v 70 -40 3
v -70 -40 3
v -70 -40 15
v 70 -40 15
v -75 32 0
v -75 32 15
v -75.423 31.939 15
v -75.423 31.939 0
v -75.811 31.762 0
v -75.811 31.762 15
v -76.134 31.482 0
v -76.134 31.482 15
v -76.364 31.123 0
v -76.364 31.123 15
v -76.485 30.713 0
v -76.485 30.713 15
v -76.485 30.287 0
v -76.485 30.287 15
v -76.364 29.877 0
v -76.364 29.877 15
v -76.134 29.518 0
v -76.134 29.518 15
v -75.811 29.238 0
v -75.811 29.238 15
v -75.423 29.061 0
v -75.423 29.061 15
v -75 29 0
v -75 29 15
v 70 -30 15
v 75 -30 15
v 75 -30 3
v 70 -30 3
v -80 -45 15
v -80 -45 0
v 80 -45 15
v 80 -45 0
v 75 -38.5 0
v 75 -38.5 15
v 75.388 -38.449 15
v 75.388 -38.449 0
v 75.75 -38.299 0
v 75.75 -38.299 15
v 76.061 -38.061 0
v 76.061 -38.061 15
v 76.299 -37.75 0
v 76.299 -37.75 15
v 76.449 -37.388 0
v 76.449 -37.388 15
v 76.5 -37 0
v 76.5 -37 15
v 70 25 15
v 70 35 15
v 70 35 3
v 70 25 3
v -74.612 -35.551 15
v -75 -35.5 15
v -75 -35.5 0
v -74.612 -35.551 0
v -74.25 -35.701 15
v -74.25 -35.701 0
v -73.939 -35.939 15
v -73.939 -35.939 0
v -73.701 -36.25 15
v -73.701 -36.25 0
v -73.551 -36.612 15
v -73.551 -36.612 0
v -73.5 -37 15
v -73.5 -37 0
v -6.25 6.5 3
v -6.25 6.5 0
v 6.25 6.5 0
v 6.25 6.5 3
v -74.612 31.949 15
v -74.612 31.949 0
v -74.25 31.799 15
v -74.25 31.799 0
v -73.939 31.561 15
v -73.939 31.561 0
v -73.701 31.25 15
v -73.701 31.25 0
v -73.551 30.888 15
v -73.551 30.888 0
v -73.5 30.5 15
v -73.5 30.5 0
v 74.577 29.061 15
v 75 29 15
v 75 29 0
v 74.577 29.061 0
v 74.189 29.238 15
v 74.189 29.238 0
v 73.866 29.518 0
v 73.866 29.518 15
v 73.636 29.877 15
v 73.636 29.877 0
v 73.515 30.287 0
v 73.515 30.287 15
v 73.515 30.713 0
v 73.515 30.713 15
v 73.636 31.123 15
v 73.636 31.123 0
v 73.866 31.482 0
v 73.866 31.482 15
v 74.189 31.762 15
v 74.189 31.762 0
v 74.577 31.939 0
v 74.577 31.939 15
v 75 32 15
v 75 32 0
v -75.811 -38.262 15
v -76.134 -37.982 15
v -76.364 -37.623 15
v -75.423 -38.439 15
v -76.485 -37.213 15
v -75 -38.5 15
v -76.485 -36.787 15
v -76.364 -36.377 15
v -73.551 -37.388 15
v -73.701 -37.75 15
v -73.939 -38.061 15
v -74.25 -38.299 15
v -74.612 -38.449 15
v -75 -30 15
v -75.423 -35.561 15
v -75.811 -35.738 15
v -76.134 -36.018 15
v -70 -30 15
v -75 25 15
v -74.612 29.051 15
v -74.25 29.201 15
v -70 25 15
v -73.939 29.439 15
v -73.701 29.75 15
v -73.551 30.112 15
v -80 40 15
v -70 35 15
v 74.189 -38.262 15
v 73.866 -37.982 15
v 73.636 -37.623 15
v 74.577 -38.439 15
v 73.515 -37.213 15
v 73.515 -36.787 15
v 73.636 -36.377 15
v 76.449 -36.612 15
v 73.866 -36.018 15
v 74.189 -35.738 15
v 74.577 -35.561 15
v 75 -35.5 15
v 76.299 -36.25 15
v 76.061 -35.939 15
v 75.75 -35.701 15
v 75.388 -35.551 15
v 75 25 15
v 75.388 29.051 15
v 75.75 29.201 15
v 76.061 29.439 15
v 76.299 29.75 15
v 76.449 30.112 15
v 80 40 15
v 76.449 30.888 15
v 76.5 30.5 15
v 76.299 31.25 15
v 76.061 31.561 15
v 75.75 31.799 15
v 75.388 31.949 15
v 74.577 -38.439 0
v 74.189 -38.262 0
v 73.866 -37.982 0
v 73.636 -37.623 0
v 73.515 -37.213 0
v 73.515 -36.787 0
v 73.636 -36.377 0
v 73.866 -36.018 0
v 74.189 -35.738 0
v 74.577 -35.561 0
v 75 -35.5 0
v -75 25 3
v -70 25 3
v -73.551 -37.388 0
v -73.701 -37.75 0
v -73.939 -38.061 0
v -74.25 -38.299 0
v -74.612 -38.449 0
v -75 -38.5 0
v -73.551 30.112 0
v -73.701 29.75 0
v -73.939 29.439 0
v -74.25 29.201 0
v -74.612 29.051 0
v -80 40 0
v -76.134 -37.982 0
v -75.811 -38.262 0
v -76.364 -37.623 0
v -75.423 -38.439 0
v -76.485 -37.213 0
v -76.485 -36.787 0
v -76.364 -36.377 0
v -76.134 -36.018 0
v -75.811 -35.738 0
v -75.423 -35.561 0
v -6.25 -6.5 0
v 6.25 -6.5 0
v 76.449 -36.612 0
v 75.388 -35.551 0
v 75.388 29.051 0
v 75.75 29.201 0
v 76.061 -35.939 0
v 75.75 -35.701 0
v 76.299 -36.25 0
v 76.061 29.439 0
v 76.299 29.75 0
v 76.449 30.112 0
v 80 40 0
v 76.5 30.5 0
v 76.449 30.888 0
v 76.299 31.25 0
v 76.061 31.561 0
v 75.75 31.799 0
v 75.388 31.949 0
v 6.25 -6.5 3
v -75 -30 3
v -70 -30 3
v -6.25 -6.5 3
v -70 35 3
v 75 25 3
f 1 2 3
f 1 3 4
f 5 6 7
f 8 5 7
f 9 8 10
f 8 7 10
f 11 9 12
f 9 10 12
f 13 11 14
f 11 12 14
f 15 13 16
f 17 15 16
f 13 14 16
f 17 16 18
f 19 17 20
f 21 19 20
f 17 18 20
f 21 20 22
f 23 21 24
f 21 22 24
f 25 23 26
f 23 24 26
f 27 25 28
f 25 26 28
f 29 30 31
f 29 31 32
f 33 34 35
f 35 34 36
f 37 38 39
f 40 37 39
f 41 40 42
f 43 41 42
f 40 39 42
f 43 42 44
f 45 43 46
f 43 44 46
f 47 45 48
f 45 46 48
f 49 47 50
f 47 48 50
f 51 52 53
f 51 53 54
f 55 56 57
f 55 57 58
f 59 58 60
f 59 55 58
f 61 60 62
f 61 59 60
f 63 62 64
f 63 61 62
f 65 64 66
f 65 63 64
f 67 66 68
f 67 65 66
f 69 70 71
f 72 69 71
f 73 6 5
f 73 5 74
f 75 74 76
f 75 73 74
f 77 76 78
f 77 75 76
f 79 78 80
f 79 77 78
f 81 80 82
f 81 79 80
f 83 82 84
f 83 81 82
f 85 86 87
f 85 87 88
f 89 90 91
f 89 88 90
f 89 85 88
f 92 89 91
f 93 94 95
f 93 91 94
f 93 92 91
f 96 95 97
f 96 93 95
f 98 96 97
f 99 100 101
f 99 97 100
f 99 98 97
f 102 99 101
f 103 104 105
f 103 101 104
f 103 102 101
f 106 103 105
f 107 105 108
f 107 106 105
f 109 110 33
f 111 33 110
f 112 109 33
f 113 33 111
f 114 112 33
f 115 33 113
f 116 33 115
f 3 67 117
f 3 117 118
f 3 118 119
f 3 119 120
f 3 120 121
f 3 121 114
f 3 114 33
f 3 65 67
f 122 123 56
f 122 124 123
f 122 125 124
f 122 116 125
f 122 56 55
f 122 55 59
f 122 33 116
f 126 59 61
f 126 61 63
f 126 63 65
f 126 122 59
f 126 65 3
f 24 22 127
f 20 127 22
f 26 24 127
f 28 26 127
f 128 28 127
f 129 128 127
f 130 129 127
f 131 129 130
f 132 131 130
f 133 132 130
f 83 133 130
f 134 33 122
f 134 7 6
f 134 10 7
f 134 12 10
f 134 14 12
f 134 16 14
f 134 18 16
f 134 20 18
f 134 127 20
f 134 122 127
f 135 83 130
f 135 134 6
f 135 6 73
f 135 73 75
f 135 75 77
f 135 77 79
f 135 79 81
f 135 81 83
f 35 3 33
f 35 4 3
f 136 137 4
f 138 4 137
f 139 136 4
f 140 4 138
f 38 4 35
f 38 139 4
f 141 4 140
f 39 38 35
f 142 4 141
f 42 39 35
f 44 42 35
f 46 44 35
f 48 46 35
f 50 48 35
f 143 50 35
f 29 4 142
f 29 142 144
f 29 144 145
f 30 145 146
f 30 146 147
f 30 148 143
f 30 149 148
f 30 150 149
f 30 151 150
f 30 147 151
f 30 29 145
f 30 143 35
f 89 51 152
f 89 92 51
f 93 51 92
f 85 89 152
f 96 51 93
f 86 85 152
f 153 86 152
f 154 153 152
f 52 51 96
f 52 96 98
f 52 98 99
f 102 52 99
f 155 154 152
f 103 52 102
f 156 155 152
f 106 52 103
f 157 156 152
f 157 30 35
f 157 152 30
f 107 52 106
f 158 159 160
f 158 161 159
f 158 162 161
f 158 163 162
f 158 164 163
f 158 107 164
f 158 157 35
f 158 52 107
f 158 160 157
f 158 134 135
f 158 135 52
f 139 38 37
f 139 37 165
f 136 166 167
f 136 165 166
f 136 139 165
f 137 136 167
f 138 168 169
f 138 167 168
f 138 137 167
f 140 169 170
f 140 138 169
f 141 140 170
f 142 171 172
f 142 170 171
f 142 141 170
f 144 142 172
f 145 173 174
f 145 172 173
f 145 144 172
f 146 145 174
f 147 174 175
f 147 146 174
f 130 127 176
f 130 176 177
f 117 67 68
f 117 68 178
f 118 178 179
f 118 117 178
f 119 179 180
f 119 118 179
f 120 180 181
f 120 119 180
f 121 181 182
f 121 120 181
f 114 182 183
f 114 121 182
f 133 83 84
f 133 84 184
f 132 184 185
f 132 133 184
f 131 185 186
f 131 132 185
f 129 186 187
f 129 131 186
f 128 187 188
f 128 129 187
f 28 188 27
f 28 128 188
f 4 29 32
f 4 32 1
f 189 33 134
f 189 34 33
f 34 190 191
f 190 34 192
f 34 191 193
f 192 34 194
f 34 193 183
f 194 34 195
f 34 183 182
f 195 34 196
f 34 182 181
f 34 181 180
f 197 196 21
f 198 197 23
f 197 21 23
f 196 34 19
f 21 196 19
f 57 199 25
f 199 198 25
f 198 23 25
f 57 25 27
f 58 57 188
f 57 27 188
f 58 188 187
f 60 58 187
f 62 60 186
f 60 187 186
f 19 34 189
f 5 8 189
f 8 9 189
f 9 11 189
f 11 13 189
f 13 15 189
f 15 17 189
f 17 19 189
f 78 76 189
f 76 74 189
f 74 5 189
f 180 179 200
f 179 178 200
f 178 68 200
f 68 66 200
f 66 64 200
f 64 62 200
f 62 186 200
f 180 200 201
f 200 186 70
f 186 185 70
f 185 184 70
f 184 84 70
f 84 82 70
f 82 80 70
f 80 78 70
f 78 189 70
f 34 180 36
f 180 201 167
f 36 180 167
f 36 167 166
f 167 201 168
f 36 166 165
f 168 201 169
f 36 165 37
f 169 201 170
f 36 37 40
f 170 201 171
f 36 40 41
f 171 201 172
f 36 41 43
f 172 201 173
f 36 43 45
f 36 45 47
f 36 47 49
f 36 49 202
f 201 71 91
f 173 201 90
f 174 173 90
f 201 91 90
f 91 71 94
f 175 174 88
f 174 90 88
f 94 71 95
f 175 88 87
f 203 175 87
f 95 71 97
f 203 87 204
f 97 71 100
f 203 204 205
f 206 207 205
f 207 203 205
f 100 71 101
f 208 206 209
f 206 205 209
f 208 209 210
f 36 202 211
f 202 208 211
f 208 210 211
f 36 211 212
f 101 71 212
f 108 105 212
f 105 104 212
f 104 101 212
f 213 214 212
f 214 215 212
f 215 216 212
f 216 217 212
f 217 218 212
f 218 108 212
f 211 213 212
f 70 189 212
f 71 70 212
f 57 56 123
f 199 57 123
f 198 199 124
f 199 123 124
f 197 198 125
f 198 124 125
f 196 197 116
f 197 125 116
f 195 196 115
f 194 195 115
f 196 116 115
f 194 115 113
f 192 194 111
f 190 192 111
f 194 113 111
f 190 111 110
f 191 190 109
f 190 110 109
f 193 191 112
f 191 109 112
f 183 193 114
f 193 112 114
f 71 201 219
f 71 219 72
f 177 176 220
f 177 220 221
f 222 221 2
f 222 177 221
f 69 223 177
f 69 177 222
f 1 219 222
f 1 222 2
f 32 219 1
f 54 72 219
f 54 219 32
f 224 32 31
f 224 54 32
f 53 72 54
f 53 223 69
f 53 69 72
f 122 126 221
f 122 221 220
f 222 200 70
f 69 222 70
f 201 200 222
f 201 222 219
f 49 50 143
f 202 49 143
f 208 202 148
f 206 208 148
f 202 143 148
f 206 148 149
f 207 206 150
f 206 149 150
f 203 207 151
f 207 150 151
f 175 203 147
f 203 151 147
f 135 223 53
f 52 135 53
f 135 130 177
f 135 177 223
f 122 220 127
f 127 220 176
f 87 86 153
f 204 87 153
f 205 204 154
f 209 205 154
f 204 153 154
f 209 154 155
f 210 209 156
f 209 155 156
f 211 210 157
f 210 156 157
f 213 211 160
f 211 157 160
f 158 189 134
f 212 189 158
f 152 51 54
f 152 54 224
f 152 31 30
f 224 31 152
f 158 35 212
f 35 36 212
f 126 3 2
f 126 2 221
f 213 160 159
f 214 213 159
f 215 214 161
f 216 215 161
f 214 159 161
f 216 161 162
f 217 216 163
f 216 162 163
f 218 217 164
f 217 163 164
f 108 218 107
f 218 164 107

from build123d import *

# Parameters (mm, degrees)
F0_W     = 160
F0_H     = 85
F0_W_2   = 12.5
F0_H_2   = 13
F1_DEPTH = 3
F2_W     = 160
F2_H     = 85
F2_W_2   = 150
F2_H_2   = 75
F3_DEPTH = 12
F5_DEPTH = 12
F6_DEPTH = 15


with BuildPart() as f1:
    # F0 (on Top) → F1 (new body)
    with BuildSketch(Plane.XY):
        with Locations((0, -2.5)):
            Rectangle(F0_W, F0_H)
        Rectangle(F0_W_2, F0_H_2, mode=Mode.SUBTRACT)
    extrude(amount=F1_DEPTH)

    # F2 (on face) → F3 (join)
    with BuildSketch(Plane.XY.offset(3)):
        with Locations((0, -2.5)):
            Rectangle(F2_W, F2_H)
        with Locations((0, -2.5)):
            Rectangle(F2_W_2, F2_H_2, mode=Mode.SUBTRACT)
    extrude(amount=F3_DEPTH)

    # F4 (on face) → F5 (join, through all)
    with BuildSketch(Plane.XY.offset(15)):
        with BuildLine():
            ThreePointArc((75, 29), (73.5, 30.5), (75, 32))
            Line((75, 32), (75, 35))
            Line((75, 35), (70, 35))
            Line((70, 35), (70, 25))
            Line((70, 25), (75, 25))
            Line((75, 25), (75, 29))
        make_face()
        with BuildLine():
            ThreePointArc((-75, 32), (-73.93934, 31.56066), (-73.5, 30.5))
            ThreePointArc((-73.5, 30.5), (-73.93934, 29.43934), (-75, 29))
            Line((-75, 29), (-75, 25))
            Line((-75, 25), (-70, 25))
            Line((-70, 25), (-70, 35))
            Line((-70, 35), (-75, 35))
            Line((-75, 35), (-75, 32))
        make_face()
        with BuildLine():
            ThreePointArc((-75, -35.5), (-73.93934, -35.93934), (-73.5, -37))
            ThreePointArc((-73.5, -37), (-73.93934, -38.06066), (-75, -38.5))
            Line((-75, -38.5), (-75, -40))
            Line((-75, -40), (-70, -40))
            Line((-70, -40), (-70, -30))
            Line((-70, -30), (-75, -30))
            Line((-75, -30), (-75, -35.5))
        make_face()
        with BuildLine():
            ThreePointArc((75, -38.5), (73.5, -37), (75, -35.5))
            Line((75, -35.5), (75, -30))
            Line((75, -30), (70, -30))
            Line((70, -30), (70, -40))
            Line((70, -40), (75, -40))
            Line((75, -40), (75, -38.5))
        make_face()
    extrude(amount=-F5_DEPTH)

    # F4 (on face) → F6 (cut, through all)
    with BuildSketch(Plane.XY.offset(15)):
        with BuildLine():
            ThreePointArc((-75, -38.5), (-73.93934, -38.06066), (-73.5, -37))
            ThreePointArc((-73.5, -37), (-73.93934, -35.93934), (-75, -35.5))
            Line((-75, -35.5), (-75, -38.5))
        make_face()
        with BuildLine():
            Line((-75, -38.5), (-75, -35.5))
            ThreePointArc((-75, -35.5), (-76.5, -37), (-75, -38.5))
        make_face()
        with BuildLine():
            ThreePointArc((75, -38.5), (76.06066, -38.06066), (76.5, -37))
            ThreePointArc((76.5, -37), (76.06066, -35.93934), (75, -35.5))
            Line((75, -35.5), (75, -38.5))
        make_face()
        with BuildLine():
            Line((75, -38.5), (75, -35.5))
            ThreePointArc((75, -35.5), (73.5, -37), (75, -38.5))
        make_face()
        with BuildLine():
            Line((75, 29), (75, 32))
            ThreePointArc((75, 32), (73.5, 30.5), (75, 29))
        make_face()
        with BuildLine():
            ThreePointArc((75, 29), (76.06066, 29.43934), (76.5, 30.5))
            ThreePointArc((76.5, 30.5), (76.06066, 31.56066), (75, 32))
            Line((75, 32), (75, 29))
        make_face()
        with BuildLine():
            ThreePointArc((-75, 29), (-73.93934, 29.43934), (-73.5, 30.5))
            ThreePointArc((-73.5, 30.5), (-73.93934, 31.56066), (-75, 32))
            Line((-75, 32), (-75, 29))
        make_face()
        with BuildLine():
            Line((-75, 29), (-75, 32))
            ThreePointArc((-75, 32), (-76.5, 30.5), (-75, 29))
        make_face()
    extrude(amount=-F6_DEPTH, mode=Mode.SUBTRACT)


solid = f1.part
